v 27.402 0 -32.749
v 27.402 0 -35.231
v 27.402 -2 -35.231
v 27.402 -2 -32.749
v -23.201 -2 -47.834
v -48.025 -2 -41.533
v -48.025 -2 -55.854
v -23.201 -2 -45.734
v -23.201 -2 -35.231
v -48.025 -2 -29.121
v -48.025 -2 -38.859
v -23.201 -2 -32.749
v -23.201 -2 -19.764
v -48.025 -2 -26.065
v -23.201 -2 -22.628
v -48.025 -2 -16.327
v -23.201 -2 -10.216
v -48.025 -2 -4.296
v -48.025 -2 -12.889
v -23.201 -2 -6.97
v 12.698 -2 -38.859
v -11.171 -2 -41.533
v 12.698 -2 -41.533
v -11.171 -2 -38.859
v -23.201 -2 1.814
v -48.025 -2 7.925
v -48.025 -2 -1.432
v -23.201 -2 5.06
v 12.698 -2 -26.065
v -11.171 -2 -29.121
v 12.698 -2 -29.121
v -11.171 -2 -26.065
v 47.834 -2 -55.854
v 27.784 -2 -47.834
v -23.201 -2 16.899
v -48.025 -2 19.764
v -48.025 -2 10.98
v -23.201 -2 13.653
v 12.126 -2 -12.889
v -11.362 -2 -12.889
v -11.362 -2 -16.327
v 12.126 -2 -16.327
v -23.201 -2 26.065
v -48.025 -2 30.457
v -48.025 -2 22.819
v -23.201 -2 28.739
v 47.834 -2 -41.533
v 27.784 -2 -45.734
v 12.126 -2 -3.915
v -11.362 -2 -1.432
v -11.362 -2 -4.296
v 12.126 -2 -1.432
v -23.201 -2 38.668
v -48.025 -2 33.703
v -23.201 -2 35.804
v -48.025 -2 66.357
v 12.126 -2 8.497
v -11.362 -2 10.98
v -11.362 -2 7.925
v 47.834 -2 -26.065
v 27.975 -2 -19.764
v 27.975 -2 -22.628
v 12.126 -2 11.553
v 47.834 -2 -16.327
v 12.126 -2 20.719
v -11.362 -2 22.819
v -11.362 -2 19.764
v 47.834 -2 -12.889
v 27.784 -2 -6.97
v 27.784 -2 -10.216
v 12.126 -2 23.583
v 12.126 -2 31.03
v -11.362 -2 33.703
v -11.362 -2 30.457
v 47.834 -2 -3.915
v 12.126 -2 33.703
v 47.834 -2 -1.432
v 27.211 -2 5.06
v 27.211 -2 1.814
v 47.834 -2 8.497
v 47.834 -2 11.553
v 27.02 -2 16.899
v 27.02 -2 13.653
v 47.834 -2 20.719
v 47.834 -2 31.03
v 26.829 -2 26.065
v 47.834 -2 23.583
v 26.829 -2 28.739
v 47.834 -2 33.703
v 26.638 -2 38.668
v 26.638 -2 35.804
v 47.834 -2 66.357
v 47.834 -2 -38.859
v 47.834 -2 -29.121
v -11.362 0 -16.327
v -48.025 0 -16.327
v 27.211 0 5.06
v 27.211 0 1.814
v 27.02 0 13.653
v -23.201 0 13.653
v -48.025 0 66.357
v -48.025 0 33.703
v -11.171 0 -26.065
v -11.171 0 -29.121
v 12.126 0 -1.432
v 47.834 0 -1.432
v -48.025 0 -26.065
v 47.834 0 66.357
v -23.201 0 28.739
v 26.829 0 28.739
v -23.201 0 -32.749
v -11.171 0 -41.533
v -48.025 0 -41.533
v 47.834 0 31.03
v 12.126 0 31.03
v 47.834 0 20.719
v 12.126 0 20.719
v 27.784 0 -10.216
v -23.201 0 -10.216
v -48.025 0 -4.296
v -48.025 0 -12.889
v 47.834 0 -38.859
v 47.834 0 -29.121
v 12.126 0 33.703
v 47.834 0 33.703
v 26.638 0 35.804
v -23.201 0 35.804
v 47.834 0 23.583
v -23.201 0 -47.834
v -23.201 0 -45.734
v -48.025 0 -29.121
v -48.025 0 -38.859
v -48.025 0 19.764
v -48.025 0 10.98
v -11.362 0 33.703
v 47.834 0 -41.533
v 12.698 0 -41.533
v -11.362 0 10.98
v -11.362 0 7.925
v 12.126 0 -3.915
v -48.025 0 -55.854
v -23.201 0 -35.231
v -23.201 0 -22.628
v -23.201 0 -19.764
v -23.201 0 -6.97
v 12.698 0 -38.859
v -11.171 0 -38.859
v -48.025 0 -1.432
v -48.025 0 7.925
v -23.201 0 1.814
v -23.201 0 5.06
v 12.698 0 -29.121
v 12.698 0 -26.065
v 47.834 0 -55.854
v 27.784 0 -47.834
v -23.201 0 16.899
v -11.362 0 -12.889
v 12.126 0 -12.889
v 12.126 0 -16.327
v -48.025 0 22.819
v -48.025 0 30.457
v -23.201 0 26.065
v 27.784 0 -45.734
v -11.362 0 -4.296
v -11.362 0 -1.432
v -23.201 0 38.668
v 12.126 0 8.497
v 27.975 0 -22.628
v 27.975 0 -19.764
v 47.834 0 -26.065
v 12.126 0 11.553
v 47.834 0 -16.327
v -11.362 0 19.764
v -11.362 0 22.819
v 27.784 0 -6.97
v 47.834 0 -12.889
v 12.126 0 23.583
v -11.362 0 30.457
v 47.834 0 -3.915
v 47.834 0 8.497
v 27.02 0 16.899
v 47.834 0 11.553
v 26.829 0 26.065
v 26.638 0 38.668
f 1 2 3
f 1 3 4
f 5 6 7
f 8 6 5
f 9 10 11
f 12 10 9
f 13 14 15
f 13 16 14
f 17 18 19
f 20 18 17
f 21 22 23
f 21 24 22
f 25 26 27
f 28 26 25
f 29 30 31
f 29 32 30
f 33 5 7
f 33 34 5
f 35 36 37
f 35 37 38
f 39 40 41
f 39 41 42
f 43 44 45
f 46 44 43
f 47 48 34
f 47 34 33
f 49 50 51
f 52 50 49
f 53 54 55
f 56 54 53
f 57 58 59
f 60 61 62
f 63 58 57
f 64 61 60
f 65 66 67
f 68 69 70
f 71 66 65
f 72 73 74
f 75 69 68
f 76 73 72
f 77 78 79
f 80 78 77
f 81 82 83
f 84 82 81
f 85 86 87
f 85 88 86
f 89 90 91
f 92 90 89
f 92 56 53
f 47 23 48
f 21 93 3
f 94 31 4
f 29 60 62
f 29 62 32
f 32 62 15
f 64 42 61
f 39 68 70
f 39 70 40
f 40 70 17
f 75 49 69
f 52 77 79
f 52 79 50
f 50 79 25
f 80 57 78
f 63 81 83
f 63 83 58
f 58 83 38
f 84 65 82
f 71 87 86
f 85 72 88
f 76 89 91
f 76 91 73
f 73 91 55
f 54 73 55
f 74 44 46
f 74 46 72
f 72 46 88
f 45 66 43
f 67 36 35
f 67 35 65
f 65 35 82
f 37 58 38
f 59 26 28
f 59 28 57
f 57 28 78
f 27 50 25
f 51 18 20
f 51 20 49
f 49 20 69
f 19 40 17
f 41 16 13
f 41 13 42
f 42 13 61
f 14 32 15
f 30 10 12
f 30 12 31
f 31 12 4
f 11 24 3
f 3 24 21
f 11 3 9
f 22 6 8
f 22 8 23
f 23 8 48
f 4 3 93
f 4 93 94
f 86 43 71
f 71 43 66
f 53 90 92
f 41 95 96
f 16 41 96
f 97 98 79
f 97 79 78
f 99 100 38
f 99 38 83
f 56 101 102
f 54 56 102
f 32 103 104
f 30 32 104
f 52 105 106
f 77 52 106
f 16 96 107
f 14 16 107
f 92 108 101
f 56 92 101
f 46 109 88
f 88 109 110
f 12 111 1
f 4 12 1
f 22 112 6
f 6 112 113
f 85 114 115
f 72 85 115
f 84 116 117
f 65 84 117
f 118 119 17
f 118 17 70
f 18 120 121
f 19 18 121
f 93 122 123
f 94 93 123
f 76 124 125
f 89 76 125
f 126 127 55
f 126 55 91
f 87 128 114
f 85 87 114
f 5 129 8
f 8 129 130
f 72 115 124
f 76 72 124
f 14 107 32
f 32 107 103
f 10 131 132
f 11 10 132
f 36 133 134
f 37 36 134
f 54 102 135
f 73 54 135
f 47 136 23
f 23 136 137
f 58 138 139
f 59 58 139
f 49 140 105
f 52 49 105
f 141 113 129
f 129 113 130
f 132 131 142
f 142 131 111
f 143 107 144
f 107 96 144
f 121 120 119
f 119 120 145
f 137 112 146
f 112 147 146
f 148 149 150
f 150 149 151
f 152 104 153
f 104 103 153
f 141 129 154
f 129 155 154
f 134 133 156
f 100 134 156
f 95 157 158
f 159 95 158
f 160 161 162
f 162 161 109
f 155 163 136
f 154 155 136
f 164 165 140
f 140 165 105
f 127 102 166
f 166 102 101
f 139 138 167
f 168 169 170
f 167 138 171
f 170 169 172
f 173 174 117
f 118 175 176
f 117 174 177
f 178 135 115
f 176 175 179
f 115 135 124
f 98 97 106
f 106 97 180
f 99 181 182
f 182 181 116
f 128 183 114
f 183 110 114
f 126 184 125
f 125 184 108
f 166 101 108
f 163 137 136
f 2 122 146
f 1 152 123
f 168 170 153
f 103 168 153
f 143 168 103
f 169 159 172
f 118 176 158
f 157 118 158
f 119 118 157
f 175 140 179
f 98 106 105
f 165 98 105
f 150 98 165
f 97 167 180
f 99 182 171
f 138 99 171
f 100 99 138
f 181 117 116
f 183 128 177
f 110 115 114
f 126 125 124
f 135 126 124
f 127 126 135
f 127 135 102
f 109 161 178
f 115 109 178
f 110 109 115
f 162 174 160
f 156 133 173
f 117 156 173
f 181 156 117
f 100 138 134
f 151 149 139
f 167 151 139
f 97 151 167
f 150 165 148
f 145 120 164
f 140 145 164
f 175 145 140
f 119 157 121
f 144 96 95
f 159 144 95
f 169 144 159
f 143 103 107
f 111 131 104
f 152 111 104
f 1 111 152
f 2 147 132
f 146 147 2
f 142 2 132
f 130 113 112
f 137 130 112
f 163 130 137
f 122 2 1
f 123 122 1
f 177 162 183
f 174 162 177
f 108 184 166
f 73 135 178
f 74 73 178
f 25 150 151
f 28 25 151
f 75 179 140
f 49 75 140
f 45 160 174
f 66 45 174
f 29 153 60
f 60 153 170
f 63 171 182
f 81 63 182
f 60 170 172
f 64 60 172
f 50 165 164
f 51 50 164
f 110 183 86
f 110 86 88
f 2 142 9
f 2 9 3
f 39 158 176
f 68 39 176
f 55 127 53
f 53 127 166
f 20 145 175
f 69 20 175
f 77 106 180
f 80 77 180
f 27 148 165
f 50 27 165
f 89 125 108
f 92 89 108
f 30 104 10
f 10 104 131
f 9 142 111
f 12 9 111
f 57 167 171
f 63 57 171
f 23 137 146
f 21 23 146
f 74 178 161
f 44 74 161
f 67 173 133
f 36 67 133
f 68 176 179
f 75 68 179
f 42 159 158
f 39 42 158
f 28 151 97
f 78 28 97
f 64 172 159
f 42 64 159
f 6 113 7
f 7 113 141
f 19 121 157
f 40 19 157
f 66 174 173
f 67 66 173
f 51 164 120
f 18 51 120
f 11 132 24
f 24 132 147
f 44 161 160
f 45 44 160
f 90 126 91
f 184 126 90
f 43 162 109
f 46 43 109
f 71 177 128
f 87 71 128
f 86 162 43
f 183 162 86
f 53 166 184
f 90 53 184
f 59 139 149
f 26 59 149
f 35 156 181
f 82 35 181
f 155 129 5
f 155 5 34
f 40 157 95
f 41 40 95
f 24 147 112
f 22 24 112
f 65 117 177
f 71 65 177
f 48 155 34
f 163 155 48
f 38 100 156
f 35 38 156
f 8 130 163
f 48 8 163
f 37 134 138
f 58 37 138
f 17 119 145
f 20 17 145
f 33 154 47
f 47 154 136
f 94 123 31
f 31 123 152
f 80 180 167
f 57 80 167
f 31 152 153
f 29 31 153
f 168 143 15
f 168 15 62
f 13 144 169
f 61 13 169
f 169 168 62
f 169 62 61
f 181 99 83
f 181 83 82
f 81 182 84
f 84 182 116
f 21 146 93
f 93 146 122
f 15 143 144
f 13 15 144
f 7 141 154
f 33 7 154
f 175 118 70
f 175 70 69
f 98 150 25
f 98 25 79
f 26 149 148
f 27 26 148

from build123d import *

# Parameters (mm, degrees)
F0_W     = 50.984893
F0_H     = 2.100501
F0_W_2   = 50.602986
F0_H_2   = 2.482414
F0_W_3   = 51.175848
F0_H_3   = 2.86432
F0_H_4   = 3.246229
F0_W_4   = 50.412029
F0_W_5   = 50.221075
F0_W_6   = 50.030118
F0_H_5   = 2.673368
F0_W_7   = 49.839167
F0_H_6   = 2.864324
F1_DEPTH = 2


with BuildPart() as f1:
    # F0 (on Front) → F1 (new body)
    with BuildSketch(Plane.XZ):
        Polygon((-48.025098, -41.532639), (-48.025098, -55.854235), (47.834139, -55.854235), (47.834139, -41.532639), (12.698486, -41.532639), (12.698486, -38.859274), (47.834139, -38.859274), (47.834139, -29.120585), (12.698486, -29.120585), (12.698486, -26.06531), (47.834139, -26.06531), (47.834139, -16.326623), (12.125621, -16.326623), (12.125621, -12.889439), (47.834139, -12.889439), (47.834139, -3.91457), (12.125621, -3.91457), (12.125621, -1.43216), (47.834139, -1.43216), (47.834139, 8.497482), (12.125621, 8.497482), (12.125621, 11.552757), (47.834139, 11.552757), (47.834139, 20.71858), (12.125621, 20.71858), (12.125621, 23.5829), (47.834139, 23.5829), (47.834139, 31.030132), (12.125621, 31.030132), (12.125621, 33.703495), (47.834139, 33.703495), (47.834139, 66.356741), (-48.025098, 66.356741), (-48.025098, 33.703495), (-11.361802, 33.703495), (-11.361802, 30.457268), (-48.025098, 30.457268), (-48.025098, 22.819081), (-11.361802, 22.819081), (-11.361802, 19.763807), (-48.025098, 19.763807), (-48.025098, 10.979893), (-11.361802, 10.979893), (-11.361802, 7.924618), (-48.025098, 7.924618), (-48.025098, -1.43216), (-11.361802, -1.43216), (-11.361802, -4.29648), (-48.025098, -4.29648), (-48.025098, -12.889439), (-11.361802, -12.889439), (-11.361802, -16.326623), (-48.025098, -16.326623), (-48.025098, -26.06531), (-11.170847, -26.06531), (-11.170847, -29.120585), (-48.025098, -29.120585), (-48.025098, -38.859274), (-11.170847, -38.859274), (-11.170847, -41.532639), align=None)
        with Locations((2.291455, -46.783892)):
            Rectangle(F0_W, F0_H, mode=Mode.SUBTRACT)
        with Locations((2.100502, -33.989929)):
            Rectangle(F0_W_2, F0_H_2, mode=Mode.SUBTRACT)
        with Locations((2.386933, -21.195967)):
            Rectangle(F0_W_3, F0_H_3, mode=Mode.SUBTRACT)
        with Locations((2.291455, -8.592959)):
            Rectangle(F0_W, F0_H_4, mode=Mode.SUBTRACT)
        with Locations((2.005024, 3.437183)):
            Rectangle(F0_W_4, F0_H_4, mode=Mode.SUBTRACT)
        with Locations((1.909546, 15.276373)):
            Rectangle(F0_W_5, F0_H_4, mode=Mode.SUBTRACT)
        with Locations((1.814068, 27.401994)):
            Rectangle(F0_W_6, F0_H_5, mode=Mode.SUBTRACT)
        with Locations((1.718592, 37.236158)):
            Rectangle(F0_W_7, F0_H_6, mode=Mode.SUBTRACT)
    extrude(amount=F1_DEPTH)


solid = f1.part
